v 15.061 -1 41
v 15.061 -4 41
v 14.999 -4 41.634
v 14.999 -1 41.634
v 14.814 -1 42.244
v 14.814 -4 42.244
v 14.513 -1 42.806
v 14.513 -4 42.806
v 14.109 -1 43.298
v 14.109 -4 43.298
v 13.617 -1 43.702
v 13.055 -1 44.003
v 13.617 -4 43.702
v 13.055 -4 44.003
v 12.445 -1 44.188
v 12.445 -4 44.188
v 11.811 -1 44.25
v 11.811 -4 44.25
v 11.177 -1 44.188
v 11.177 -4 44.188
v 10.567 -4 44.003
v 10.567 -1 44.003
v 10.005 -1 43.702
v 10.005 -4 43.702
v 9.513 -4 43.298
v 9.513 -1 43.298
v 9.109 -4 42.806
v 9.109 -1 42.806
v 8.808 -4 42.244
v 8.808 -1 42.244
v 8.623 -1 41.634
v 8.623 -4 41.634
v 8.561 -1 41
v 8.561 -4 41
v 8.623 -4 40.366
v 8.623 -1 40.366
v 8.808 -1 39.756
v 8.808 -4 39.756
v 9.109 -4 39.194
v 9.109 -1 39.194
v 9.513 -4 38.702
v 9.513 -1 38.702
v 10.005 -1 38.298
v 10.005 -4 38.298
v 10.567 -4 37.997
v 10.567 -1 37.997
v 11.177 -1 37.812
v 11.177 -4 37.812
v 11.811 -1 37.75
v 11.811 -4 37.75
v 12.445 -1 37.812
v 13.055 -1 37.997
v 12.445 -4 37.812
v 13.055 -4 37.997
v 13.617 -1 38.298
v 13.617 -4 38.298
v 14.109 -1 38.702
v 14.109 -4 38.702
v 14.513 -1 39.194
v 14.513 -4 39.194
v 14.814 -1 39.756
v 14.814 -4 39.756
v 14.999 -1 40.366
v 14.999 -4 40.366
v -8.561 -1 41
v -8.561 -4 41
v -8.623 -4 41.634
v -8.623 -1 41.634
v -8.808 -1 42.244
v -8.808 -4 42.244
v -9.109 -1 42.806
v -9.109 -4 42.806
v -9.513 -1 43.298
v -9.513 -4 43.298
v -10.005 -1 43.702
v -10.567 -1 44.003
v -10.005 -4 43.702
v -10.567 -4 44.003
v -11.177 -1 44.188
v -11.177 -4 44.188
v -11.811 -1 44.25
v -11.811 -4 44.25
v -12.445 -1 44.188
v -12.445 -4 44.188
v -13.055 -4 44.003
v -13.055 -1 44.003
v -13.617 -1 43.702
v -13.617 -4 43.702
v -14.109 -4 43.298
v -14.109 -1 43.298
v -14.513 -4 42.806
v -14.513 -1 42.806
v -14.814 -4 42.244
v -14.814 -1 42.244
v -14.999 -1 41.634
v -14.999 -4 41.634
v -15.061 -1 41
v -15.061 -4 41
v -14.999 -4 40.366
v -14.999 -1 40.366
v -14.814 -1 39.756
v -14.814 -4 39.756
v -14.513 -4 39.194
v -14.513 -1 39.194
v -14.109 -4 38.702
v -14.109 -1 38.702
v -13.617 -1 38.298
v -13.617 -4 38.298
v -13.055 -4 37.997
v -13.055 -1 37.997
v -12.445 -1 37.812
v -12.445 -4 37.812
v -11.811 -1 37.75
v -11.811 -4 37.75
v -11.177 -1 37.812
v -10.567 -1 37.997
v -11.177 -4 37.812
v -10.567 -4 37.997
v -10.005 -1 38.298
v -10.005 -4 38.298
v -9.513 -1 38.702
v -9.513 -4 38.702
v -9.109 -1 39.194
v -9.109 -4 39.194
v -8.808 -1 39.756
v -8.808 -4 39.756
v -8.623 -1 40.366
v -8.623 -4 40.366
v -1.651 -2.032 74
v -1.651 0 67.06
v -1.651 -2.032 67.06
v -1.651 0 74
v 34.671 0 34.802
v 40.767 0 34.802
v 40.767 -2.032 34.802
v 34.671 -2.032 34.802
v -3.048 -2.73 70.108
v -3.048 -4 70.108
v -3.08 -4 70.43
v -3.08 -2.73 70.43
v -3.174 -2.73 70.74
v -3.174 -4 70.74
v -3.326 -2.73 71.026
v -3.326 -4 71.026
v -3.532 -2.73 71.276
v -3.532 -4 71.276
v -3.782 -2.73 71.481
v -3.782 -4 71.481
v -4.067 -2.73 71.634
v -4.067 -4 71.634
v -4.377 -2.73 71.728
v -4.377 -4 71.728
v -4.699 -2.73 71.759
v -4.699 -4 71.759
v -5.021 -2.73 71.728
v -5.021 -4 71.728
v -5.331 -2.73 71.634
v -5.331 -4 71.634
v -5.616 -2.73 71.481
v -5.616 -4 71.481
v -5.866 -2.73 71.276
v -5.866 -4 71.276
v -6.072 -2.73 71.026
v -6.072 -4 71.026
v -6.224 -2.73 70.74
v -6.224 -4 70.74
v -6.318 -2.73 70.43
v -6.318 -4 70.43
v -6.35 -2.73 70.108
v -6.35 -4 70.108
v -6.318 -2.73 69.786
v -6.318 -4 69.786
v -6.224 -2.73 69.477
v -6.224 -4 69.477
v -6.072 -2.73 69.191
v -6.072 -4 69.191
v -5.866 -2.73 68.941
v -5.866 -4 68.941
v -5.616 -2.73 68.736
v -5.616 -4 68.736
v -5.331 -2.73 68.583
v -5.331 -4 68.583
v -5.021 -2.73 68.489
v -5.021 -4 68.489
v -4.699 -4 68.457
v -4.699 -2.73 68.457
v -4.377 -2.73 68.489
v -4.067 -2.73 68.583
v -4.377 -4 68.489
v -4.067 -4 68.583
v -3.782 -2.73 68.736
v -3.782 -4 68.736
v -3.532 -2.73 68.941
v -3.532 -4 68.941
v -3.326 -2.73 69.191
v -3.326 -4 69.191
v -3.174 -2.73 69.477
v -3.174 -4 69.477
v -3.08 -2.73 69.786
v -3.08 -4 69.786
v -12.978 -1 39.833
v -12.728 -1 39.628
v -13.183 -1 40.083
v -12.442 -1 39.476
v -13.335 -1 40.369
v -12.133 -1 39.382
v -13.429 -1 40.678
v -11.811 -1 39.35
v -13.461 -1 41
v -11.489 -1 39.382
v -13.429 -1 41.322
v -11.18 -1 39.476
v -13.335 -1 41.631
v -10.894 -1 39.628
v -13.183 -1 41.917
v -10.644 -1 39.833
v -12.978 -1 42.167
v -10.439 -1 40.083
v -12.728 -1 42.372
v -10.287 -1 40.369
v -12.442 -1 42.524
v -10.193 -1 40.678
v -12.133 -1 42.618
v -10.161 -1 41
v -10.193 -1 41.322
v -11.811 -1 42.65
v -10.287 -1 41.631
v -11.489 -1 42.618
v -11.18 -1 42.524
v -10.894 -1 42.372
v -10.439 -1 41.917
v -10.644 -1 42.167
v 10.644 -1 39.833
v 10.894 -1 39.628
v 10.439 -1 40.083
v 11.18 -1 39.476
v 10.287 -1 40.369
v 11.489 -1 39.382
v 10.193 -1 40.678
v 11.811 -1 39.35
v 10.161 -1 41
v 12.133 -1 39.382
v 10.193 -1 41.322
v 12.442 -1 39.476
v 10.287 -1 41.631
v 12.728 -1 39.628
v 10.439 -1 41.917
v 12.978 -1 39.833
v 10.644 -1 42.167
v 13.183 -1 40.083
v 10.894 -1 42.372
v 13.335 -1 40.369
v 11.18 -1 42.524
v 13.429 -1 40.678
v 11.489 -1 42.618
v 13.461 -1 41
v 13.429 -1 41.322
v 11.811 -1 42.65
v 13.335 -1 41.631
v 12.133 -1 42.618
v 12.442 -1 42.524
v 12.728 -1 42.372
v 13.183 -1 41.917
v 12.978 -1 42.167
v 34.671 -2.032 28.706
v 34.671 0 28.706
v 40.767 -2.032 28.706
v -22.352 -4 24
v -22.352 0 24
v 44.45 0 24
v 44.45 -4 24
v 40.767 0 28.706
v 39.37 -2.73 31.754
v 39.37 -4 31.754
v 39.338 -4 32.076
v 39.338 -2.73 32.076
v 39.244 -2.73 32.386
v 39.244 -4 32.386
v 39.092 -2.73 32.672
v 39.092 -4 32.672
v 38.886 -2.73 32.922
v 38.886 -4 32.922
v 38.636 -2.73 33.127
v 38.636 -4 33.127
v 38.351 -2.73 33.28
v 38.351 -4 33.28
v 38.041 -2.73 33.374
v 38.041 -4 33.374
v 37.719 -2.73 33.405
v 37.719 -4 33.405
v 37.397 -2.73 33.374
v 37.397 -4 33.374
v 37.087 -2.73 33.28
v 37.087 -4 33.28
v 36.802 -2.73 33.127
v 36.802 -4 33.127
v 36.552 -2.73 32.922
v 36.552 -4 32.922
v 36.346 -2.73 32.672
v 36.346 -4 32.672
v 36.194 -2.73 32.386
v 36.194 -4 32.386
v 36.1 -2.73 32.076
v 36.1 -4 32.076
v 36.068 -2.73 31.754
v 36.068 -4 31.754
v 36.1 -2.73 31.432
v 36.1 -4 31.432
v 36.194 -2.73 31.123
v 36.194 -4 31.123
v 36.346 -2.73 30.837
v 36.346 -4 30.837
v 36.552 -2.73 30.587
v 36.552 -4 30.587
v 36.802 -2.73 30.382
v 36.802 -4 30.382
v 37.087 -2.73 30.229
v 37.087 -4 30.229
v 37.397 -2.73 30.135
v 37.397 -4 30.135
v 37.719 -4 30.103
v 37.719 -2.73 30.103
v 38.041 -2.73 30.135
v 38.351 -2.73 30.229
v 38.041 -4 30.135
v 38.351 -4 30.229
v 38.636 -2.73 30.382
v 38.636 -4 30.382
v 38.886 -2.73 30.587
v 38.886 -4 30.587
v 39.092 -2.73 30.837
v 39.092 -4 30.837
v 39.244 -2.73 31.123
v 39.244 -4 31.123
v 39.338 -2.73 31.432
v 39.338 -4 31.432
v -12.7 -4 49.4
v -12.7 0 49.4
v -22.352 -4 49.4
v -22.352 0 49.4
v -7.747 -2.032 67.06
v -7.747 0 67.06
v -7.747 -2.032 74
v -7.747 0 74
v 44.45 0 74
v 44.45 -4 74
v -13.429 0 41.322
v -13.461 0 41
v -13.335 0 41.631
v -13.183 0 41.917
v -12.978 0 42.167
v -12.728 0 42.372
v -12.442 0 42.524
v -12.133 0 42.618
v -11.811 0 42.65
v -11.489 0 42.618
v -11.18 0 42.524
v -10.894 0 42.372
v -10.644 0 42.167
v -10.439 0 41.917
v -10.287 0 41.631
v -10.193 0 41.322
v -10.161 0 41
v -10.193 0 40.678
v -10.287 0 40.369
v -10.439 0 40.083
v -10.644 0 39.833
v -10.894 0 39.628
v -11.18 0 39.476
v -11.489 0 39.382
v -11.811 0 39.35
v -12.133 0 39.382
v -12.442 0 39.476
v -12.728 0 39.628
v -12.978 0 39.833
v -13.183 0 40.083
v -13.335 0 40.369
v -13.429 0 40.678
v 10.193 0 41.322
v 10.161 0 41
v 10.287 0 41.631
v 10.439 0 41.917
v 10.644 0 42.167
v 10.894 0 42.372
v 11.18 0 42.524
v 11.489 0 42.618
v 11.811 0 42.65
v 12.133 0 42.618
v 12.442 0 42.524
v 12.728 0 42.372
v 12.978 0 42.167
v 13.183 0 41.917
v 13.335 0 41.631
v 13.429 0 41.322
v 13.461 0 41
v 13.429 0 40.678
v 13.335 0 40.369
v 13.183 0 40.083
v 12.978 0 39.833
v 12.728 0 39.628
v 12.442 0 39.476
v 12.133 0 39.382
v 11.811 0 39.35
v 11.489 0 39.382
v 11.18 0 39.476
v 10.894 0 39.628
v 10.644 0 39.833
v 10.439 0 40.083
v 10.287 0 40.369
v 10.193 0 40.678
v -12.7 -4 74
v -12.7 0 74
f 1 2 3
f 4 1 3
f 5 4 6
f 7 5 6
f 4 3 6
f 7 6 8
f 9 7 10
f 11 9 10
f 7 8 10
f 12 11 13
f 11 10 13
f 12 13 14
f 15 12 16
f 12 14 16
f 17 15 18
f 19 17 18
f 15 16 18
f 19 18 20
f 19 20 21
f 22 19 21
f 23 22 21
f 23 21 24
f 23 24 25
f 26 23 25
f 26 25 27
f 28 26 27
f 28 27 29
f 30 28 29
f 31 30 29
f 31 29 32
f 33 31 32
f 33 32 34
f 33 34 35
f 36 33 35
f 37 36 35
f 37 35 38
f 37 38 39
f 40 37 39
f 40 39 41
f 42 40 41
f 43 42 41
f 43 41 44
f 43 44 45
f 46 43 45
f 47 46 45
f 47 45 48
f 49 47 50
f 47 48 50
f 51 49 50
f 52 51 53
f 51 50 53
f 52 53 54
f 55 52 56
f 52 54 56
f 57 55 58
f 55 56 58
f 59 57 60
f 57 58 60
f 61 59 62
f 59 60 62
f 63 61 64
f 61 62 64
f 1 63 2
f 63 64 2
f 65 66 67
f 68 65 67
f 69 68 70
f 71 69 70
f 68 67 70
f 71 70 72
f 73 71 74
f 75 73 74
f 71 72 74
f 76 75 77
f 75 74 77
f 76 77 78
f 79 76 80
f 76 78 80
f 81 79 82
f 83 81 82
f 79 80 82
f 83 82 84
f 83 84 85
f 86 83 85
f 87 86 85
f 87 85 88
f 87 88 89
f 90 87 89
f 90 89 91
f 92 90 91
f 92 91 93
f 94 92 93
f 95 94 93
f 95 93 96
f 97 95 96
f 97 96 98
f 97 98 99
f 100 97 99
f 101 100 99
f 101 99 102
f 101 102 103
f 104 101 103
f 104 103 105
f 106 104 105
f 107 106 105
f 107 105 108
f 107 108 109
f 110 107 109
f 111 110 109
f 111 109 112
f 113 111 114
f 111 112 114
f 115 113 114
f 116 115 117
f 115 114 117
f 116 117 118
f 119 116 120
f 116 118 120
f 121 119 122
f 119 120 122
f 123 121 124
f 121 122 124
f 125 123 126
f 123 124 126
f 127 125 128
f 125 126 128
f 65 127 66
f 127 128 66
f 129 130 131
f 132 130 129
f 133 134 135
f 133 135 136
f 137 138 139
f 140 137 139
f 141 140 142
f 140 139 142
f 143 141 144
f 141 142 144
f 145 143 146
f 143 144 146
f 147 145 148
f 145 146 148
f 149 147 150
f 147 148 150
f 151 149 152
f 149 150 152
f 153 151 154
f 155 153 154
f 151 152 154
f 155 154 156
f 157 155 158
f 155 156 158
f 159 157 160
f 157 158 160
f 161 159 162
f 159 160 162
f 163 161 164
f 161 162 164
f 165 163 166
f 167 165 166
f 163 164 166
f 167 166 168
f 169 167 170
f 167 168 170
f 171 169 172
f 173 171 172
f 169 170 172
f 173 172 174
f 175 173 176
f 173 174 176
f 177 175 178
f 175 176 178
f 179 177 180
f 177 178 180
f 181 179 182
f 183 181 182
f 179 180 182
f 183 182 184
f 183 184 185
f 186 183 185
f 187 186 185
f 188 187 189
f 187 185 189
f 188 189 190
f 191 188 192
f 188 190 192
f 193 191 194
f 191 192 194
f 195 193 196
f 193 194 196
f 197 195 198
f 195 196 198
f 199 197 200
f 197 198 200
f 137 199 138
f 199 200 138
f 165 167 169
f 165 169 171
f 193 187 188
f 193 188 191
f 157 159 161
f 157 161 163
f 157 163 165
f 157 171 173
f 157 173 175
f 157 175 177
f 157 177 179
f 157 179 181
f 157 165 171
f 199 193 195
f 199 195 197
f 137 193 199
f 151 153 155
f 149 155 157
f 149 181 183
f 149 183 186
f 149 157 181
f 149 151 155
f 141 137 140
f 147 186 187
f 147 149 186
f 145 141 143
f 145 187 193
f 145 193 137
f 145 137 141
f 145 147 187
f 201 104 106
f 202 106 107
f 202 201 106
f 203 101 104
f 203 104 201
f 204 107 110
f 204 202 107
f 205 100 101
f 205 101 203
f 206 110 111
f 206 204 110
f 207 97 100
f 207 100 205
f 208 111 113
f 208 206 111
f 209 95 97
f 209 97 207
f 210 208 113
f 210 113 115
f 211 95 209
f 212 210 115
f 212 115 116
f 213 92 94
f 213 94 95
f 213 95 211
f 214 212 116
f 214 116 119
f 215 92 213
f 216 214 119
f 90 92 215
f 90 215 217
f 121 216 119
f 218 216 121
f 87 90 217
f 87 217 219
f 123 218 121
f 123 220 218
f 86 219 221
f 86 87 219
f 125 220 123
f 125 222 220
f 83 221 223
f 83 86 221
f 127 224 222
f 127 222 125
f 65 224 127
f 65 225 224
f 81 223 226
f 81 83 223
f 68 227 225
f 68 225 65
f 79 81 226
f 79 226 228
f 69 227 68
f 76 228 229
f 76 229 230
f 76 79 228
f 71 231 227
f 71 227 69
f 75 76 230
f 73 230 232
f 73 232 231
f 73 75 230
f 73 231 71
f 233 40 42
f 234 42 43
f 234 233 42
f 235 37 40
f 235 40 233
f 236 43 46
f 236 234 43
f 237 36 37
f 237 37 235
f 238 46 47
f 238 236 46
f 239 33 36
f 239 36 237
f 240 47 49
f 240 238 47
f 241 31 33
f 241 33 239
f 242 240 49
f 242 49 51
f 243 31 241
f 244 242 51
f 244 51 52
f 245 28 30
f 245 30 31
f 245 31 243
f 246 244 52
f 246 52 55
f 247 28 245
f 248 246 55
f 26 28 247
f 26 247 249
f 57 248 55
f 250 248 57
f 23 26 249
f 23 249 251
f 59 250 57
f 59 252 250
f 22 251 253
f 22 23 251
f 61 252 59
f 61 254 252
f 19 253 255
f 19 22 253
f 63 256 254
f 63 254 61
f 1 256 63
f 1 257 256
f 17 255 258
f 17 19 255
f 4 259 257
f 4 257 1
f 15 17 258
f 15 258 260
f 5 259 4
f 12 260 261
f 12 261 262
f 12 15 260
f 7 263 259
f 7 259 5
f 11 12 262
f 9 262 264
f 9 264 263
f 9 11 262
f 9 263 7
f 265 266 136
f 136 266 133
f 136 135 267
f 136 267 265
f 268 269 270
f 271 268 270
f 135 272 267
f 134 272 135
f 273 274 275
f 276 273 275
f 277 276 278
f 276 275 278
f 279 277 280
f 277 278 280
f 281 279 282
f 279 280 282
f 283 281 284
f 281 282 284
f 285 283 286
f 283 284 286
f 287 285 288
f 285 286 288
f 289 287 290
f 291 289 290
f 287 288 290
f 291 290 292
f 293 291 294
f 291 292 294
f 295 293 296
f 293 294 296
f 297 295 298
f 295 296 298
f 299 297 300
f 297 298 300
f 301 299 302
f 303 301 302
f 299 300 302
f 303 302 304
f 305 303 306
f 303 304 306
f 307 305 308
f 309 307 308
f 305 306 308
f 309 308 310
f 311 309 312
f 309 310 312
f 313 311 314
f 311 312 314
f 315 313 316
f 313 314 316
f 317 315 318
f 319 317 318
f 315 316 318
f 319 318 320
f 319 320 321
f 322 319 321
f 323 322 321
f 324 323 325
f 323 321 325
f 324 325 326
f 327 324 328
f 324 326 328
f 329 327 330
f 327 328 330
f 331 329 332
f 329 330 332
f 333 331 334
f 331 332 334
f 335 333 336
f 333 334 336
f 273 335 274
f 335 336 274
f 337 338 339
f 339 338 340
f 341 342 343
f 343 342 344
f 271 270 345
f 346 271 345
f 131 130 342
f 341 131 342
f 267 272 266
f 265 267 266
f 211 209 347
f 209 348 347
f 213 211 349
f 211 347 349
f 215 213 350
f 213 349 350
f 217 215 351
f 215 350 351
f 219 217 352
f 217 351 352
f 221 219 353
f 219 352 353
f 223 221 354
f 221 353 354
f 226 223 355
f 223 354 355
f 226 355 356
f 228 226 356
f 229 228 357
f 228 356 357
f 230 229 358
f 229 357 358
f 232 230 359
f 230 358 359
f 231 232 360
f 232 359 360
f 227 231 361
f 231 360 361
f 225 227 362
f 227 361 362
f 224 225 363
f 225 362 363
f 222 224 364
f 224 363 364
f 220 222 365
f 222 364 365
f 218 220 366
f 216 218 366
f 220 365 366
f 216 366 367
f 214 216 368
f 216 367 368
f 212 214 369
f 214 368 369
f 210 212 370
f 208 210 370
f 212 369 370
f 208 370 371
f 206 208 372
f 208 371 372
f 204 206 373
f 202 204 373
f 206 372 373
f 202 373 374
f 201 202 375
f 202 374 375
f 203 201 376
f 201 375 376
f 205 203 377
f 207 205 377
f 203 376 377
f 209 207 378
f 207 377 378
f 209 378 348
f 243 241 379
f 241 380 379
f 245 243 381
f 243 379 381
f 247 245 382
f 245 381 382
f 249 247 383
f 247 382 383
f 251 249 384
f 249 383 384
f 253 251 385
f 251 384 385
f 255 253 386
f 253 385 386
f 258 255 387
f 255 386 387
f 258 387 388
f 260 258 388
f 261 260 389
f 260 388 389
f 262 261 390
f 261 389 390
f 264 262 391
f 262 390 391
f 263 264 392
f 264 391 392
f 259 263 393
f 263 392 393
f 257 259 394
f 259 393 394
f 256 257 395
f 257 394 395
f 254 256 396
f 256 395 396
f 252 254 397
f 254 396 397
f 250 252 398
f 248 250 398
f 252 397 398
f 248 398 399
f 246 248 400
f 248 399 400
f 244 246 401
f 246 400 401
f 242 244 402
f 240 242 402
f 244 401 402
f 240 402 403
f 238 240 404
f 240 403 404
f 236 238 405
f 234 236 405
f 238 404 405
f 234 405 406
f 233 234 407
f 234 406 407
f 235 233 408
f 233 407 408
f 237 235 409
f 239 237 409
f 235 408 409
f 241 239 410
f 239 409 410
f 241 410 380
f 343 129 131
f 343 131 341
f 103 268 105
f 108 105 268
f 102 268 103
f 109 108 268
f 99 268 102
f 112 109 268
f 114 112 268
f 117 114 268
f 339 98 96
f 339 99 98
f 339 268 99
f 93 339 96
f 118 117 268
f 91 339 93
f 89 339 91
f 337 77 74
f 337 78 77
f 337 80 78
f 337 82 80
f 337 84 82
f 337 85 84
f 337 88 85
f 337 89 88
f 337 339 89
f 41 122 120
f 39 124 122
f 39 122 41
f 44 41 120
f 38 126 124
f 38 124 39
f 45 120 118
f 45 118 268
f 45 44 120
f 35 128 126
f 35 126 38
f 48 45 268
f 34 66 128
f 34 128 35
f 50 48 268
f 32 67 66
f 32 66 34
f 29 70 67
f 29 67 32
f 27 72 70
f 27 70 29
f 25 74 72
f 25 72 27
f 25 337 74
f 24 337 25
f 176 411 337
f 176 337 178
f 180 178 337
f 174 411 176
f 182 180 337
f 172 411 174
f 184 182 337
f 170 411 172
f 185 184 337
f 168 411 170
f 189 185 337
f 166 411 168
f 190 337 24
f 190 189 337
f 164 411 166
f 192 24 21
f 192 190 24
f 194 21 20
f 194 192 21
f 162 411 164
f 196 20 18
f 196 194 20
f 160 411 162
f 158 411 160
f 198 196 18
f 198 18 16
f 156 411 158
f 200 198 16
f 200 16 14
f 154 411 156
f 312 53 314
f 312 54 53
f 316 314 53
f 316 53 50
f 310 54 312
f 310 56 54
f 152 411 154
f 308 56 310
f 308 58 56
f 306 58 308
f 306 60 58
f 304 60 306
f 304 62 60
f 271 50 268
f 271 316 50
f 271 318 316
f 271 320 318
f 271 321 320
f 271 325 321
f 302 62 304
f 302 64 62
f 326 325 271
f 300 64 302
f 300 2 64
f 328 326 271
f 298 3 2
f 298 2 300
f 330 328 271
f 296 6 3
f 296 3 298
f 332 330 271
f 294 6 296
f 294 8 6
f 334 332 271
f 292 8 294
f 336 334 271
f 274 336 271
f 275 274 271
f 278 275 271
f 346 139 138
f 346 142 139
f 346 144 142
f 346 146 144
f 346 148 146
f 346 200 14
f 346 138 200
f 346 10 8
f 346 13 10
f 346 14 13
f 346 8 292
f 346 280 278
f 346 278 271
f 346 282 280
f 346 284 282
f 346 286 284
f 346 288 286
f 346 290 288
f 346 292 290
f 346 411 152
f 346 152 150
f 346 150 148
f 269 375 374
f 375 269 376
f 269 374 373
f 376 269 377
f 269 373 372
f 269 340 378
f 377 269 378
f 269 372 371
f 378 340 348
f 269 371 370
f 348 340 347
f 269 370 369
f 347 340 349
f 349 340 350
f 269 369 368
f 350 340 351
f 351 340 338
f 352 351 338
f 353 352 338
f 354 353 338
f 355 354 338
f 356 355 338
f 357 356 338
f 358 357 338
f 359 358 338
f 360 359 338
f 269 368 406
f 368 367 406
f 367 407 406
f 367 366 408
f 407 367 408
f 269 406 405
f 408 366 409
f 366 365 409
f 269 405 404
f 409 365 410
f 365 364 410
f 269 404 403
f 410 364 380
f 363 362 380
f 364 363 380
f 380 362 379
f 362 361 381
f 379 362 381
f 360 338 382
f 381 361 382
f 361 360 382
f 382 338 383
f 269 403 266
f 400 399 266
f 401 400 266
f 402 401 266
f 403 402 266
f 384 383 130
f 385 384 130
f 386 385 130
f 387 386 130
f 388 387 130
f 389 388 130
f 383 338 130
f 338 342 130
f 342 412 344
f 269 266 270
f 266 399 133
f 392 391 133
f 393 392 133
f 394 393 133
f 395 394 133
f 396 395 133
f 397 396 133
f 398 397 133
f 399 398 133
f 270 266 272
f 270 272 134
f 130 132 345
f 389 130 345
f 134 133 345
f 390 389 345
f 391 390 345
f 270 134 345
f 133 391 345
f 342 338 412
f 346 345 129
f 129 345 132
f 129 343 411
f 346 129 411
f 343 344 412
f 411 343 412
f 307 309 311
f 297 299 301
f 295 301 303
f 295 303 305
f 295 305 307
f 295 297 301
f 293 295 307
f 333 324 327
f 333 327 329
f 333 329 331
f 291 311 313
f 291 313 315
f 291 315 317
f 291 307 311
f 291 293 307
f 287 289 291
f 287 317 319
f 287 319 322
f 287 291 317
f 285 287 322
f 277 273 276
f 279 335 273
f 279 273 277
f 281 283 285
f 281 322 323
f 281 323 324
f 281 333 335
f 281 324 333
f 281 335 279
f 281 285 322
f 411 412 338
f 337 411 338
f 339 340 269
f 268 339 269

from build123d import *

# Parameters (mm, degrees)
F1_DEPTH       = 4
F3_D           = 3.3
F3_CBORE_D     = 6.5
F3_CBORE_DEPTH = 3
F5_W           = 6.096
F5_H           = 15.1188707026
F5_H_2         = 6.096
F6_DEPTH       = 2.032
F4_R           = 1.651
F7_DEPTH       = 1.27


with BuildPart() as f1:
    # F0 (on Front) → F1 (new body)
    with BuildSketch(Plane.XZ):
        Polygon((44.45, 74), (-12.7, 74), (-12.7, 49.4), (-22.352, 49.4), (-22.352, 24), (44.45, 24), align=None)
    extrude(amount=F1_DEPTH)

    # F3 (through all)
    with Locations(Plane.XZ.offset(4)):
        with Locations((-11.811, 41), (11.811, 41)):
            CounterBoreHole(F3_D / 2, F3_CBORE_D / 2, F3_CBORE_DEPTH)

    # F5 (on face) → F6 (cut)
    with BuildSketch(Plane(origin=(0, 0, 0), x_dir=(-1, 0, 0), z_dir=(0, 1, 0))):
        with Locations((4.699, 74.6198353513)):
            Rectangle(F5_W, F5_H)
        with Locations((-37.719, 31.7544)):
            Rectangle(F5_W, F5_H_2)
    extrude(amount=-F6_DEPTH, mode=Mode.SUBTRACT)

    # F4 (on face) → F7 (cut)
    with BuildSketch(Plane.XZ.offset(4)):
        with Locations((37.719, 31.7544)):
            Circle(F4_R)
        with Locations((-4.699, 70.1084)):
            Circle(F4_R)
    extrude(amount=-F7_DEPTH, mode=Mode.SUBTRACT)


solid = f1.part
